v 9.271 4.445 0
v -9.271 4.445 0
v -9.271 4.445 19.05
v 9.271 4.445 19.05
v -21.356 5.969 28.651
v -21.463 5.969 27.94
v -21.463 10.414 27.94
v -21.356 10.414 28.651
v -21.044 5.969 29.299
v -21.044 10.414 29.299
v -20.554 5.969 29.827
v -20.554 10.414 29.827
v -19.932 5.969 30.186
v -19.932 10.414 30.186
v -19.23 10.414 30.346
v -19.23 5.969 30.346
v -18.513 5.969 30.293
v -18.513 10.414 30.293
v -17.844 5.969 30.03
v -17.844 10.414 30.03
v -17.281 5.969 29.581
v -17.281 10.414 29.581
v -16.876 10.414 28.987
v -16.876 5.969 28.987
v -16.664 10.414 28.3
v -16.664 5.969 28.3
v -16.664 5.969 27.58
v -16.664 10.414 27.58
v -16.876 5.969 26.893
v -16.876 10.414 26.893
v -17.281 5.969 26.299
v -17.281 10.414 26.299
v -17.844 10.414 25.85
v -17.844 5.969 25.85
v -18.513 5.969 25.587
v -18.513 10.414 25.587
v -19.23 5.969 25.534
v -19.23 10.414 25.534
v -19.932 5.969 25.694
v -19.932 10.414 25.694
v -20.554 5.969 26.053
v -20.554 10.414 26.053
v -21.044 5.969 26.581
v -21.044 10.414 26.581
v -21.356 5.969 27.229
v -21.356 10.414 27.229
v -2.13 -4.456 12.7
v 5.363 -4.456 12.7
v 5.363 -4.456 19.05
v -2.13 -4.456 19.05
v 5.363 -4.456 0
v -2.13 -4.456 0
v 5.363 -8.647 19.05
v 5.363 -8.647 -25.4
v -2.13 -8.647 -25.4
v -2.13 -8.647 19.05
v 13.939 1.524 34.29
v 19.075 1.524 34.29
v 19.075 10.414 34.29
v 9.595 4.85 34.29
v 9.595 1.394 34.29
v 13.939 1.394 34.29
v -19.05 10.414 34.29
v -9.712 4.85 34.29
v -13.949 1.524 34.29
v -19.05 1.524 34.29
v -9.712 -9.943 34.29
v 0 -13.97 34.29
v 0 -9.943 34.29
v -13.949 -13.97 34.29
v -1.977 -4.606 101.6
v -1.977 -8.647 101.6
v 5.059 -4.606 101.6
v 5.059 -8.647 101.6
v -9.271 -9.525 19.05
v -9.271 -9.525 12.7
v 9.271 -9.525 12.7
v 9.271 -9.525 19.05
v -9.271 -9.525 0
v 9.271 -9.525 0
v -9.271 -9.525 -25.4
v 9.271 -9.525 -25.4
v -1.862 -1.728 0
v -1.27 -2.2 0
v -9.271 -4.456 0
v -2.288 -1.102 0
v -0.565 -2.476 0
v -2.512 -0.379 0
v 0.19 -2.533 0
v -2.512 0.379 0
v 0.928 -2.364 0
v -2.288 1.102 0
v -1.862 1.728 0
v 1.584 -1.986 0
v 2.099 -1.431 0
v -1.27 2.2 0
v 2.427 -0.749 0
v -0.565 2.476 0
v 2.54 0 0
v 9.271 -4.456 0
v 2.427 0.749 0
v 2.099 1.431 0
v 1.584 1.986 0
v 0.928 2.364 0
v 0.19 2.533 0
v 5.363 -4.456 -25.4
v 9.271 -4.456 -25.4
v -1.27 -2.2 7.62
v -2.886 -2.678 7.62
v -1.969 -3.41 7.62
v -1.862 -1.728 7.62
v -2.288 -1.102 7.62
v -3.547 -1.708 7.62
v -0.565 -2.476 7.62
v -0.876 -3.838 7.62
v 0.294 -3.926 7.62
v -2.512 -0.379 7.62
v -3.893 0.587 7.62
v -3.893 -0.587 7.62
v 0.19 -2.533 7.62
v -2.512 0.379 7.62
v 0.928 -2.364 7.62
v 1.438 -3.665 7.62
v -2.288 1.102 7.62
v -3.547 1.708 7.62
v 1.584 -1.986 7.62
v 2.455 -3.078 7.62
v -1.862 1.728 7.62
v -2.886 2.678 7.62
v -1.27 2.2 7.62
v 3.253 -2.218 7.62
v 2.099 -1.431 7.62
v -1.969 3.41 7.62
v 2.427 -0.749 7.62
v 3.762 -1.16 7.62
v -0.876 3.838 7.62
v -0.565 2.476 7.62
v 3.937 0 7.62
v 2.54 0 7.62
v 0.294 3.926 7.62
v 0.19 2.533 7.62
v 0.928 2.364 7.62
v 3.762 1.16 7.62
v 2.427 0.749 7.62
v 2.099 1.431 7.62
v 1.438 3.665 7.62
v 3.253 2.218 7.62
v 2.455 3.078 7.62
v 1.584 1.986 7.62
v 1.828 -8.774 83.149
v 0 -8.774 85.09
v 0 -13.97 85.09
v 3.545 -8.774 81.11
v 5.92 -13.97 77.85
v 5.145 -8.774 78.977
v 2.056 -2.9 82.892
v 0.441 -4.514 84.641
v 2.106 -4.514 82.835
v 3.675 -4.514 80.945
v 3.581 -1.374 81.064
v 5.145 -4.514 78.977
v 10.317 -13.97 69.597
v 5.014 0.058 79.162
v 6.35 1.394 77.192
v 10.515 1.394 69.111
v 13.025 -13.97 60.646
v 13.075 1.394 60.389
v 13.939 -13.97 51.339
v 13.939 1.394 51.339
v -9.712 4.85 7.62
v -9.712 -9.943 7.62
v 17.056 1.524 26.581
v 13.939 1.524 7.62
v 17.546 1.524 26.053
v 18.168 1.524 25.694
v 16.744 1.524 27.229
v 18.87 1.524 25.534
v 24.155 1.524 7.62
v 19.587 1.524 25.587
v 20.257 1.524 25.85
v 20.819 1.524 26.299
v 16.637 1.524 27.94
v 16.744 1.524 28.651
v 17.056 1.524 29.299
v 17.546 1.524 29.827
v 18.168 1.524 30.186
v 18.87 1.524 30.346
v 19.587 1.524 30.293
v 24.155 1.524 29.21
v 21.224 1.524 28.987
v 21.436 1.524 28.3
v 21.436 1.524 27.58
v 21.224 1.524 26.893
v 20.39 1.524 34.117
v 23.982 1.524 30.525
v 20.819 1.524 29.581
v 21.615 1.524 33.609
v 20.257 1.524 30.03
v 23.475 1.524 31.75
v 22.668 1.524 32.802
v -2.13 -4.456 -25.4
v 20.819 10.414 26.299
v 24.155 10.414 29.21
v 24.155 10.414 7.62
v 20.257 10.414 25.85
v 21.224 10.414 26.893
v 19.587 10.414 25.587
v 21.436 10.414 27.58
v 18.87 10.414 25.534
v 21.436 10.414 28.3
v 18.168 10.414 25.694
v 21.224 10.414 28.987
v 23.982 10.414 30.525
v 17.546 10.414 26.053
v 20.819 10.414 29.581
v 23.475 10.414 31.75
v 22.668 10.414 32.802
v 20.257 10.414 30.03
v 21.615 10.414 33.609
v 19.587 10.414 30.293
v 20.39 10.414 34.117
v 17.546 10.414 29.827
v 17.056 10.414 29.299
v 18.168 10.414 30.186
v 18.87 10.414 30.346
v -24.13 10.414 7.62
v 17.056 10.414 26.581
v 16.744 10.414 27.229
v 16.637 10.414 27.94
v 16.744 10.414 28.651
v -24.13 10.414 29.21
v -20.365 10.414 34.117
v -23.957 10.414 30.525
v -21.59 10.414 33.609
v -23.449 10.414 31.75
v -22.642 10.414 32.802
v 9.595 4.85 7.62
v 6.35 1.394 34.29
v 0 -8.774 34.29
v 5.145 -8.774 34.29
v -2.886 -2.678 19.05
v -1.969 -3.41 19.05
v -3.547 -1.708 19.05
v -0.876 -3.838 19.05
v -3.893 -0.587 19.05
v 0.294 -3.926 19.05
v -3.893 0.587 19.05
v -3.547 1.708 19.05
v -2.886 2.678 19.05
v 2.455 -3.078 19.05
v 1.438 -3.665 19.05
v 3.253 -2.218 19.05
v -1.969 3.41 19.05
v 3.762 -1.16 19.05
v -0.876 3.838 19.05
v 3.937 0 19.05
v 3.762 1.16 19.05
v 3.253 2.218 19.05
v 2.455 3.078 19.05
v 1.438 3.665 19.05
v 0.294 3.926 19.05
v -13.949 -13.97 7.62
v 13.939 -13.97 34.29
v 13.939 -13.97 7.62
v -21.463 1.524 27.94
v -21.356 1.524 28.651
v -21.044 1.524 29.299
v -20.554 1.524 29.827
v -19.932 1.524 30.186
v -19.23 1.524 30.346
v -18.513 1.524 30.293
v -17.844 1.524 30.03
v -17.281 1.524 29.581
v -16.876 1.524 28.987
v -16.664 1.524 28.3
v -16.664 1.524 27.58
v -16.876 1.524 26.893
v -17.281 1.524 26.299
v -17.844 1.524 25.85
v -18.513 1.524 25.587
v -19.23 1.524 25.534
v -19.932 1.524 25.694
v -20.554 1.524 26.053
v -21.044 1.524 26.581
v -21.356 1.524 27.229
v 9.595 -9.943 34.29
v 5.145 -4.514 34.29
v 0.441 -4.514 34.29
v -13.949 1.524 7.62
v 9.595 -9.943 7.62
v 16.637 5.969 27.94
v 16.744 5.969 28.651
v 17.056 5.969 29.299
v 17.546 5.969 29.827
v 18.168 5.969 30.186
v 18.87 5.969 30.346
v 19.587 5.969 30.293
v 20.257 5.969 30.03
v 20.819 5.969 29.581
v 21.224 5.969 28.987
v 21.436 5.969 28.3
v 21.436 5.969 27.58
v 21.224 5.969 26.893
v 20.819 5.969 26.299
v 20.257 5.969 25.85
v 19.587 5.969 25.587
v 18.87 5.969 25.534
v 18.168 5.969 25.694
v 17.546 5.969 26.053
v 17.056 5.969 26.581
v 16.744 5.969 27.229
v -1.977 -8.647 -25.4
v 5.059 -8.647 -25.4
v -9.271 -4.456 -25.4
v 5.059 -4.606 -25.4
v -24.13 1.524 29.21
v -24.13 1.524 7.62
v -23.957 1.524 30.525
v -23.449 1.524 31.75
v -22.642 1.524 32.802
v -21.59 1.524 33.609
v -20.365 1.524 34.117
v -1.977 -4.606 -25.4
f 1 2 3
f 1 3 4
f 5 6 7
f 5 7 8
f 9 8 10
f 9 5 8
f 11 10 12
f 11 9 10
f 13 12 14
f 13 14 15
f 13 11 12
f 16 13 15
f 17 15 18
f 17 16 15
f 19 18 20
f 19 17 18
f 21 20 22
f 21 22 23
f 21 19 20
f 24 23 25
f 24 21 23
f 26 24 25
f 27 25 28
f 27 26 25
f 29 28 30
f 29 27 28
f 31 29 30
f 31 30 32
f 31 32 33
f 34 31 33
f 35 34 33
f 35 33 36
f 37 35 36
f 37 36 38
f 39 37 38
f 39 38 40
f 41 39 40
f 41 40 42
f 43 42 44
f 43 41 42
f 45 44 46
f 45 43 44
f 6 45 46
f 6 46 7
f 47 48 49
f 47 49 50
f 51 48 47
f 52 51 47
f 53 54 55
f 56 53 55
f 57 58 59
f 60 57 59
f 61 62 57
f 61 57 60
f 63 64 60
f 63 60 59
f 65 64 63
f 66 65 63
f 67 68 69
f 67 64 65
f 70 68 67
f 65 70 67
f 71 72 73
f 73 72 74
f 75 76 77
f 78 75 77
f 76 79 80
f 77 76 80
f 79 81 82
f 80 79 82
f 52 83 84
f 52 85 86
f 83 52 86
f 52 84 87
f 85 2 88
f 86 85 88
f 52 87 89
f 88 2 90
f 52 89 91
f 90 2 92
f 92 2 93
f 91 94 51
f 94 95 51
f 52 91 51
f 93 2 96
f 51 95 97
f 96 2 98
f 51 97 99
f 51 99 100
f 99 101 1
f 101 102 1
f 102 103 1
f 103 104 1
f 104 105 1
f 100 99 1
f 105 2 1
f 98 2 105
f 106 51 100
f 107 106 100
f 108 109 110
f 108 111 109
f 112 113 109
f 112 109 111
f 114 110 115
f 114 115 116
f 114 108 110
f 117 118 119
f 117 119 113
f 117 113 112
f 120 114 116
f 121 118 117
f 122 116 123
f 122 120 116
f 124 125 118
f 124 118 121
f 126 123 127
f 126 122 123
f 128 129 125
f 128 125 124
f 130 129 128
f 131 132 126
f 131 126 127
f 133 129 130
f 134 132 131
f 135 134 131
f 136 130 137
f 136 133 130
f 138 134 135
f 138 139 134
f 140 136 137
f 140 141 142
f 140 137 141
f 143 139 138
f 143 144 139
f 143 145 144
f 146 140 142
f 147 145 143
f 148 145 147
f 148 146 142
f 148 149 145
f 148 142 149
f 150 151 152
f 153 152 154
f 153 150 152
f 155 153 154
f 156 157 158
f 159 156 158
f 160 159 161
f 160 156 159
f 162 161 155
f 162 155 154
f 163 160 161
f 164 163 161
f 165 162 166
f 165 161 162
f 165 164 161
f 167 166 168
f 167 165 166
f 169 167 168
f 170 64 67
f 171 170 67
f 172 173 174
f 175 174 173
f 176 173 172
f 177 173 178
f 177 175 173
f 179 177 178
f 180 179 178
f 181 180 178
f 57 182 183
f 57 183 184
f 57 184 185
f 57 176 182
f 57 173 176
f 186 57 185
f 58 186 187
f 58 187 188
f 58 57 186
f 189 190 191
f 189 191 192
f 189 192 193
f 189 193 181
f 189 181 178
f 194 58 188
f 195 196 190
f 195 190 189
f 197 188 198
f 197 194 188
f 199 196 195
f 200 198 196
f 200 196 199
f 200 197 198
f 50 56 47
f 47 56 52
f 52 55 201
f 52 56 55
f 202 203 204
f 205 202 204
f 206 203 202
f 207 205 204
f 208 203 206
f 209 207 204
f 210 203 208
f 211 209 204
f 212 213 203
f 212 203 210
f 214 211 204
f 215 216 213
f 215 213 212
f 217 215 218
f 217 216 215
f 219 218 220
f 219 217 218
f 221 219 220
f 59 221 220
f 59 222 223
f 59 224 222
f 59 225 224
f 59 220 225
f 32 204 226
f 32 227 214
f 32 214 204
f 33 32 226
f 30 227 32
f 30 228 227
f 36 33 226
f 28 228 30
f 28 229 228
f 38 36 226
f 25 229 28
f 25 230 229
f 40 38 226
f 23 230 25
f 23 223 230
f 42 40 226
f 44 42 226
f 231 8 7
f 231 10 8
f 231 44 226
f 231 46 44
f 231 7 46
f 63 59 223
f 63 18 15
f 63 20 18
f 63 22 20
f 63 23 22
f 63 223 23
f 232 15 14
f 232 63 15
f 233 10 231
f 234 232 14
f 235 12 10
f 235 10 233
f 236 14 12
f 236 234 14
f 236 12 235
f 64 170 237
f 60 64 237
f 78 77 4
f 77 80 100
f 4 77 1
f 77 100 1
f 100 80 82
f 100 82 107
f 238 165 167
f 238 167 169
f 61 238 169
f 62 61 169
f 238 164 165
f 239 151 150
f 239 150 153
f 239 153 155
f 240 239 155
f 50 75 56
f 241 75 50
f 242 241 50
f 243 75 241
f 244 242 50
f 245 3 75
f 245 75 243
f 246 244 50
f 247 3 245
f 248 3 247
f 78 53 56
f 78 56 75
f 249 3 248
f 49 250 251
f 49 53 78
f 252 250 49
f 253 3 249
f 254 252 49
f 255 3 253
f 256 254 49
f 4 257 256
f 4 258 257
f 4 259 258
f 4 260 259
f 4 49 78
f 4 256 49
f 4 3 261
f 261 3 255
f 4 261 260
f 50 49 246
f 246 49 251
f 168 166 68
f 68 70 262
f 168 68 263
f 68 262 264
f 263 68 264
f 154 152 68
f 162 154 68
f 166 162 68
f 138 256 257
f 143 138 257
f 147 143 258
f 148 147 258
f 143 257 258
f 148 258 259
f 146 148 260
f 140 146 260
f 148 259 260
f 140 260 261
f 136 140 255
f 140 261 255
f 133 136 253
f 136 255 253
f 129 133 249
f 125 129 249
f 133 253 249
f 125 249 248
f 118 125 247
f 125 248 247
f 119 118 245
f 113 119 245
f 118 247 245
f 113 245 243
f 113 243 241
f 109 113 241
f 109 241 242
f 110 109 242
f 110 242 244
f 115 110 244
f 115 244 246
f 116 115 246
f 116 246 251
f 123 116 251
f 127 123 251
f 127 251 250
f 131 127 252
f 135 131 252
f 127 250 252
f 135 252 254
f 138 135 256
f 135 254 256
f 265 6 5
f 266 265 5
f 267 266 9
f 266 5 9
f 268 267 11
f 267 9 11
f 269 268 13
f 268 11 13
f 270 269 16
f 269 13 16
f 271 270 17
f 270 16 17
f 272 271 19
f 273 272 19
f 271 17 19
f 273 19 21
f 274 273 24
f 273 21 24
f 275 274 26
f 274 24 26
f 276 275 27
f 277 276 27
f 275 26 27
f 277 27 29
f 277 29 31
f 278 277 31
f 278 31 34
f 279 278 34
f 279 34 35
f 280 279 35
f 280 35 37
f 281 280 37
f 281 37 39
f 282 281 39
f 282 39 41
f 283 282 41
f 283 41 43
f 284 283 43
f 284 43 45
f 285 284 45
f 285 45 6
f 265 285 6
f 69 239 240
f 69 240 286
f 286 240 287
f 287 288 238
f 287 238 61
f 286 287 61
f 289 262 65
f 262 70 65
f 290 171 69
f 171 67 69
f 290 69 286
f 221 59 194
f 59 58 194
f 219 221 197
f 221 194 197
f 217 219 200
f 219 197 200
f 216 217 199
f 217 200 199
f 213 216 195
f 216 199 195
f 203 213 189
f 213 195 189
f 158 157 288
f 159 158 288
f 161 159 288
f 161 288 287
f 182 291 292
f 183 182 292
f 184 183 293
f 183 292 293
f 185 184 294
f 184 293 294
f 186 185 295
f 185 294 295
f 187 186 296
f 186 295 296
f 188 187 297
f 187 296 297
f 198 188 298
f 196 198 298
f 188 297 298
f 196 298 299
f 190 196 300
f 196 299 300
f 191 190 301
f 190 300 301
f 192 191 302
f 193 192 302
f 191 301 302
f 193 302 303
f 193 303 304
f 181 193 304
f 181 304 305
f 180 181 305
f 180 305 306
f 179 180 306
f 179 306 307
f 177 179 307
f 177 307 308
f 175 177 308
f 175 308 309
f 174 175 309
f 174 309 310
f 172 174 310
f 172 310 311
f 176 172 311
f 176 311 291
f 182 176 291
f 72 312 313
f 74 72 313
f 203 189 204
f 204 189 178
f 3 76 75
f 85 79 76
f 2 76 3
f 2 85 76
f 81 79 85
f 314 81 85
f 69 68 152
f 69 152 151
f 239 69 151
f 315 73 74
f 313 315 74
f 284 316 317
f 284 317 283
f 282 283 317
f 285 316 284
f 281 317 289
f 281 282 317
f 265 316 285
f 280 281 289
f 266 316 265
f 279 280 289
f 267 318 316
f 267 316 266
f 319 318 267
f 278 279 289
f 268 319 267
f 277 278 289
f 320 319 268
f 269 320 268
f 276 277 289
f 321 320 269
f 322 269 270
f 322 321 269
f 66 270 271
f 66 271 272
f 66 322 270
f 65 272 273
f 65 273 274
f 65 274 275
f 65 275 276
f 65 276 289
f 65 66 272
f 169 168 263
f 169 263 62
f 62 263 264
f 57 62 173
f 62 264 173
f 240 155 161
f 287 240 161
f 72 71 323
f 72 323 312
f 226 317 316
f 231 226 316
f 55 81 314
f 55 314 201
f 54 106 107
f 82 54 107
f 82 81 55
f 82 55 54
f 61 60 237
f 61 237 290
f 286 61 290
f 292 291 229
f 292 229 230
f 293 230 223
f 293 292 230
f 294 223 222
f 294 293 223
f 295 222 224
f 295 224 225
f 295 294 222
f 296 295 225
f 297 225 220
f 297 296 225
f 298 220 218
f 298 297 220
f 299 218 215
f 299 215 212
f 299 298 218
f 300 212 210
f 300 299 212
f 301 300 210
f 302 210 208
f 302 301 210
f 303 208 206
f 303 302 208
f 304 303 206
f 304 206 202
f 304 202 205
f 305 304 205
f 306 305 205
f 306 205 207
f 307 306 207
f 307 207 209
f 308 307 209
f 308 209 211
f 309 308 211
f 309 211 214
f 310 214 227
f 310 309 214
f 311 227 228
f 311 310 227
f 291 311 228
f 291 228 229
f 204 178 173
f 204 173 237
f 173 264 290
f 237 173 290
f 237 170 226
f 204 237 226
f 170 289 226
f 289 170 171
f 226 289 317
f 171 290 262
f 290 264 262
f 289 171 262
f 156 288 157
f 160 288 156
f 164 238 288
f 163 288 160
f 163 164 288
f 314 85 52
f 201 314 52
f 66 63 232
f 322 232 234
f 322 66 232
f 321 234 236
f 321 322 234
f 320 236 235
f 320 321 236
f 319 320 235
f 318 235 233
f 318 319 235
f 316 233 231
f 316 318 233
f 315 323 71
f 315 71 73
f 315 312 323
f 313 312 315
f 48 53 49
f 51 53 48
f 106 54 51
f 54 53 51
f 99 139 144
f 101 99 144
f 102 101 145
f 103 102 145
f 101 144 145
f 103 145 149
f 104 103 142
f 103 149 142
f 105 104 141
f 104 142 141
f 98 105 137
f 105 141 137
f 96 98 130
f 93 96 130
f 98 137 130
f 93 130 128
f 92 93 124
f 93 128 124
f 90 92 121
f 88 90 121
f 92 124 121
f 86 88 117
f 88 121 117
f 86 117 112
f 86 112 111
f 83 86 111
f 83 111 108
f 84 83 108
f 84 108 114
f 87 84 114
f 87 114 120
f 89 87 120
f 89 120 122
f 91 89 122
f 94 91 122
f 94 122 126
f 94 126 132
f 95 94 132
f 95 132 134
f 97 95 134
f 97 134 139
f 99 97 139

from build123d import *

# Parameters (mm, degrees)
F0_W         = 18.542
F0_H         = 8.89
F1_DEPTH     = 6.35
F2_DEPTH     = 5.08
F3_W         = 18.542
F3_H         = 5.0685656011
F4_DEPTH     = 25.4
F5_W         = 7.493
F5_H         = 4.191
F6_DEPTH     = 125.222
F7_DEPTH     = 6.35
F8_W         = 7.0358
F8_H         = 4.0401988663
F9_DEPTH     = 127
F11_DEPTH    = 21.59
F12_R        = 2.413
F13_DEPTH    = 25.4
F14_W        = 19.3073768169
F14_H        = 14.7933904082
F15_DEPTH    = 41.656
F16_W        = 10.1808982092
F16_H        = 21.59
F16_W_2      = 10.2163404226
F17_DEPTH    = 15.494
F18_DEPTH    = 5.08
F19_DEPTH    = 6.35
F20_W        = 13.9391366392
F20_H        = 15.3644406528
F21_DEPTH    = 50.8
F22_T1_DEPTH = 184.1193966406
F23_SIZE     = 6.35
F24_R        = 5.08
F25_W        = 7.1110432036
F25_H        = 4.2591807432
F26_DEPTH    = 73.152
F27_DEPTH    = 4.445
F28_R        = 2.54
F30_DEPTH    = 25.4
F29_R        = 3.937
F31_DEPTH    = 11.43


# Not quite as in the source:
# - a fillet or chamfer that OpenCascade refuses, or shapes differently, is made with other operations: its cross-section is extruded or revolved along the edge and cut away or added


with BuildPart() as f1:
    # F0 (on Top) → F1 (new body)
    with BuildSketch(Plane.XY):
        Rectangle(F0_W, F0_H)
    extrude(amount=F1_DEPTH)

    # F2 (add): a face of the model
    f2_faces = [f1.faces().sort_by_distance(p)[0] for p in [
        (0, -4.445, 3.175),
    ]]
    extrude(f2_faces, amount=F2_DEPTH)

    # F3 (on face) → F4 (join)
    with BuildSketch(Plane(origin=(0, 0, 0), x_dir=(1, 0, 0), z_dir=(0, 0, -1))):
        with Locations((0, 6.9907171994)):
            Rectangle(F3_W, F3_H)
    extrude(amount=F4_DEPTH)

    # F5 (on face) → F6 (cut)
    with BuildSketch(Plane(origin=(0, 0, -25.4), x_dir=(1, 0, 0), z_dir=(0, 0, -1))):
        with Locations((1.6165795822, 6.5519343989)):
            Rectangle(F5_W, F5_H)
    extrude(amount=-F6_DEPTH, mode=Mode.SUBTRACT)

    # F7 (add): a face of the model
    f7_faces = [f1.faces().sort_by_distance(p)[0] for p in [
        (-0.2230199424, -1.9865219107, 6.35),
    ]]
    extrude(f7_faces, amount=F7_DEPTH)

    # F19 (add): a face of the model
    f19_faces = [f1.faces().sort_by_distance(p)[0] for p in [
        (-0.2230199424, -1.9865219107, 12.7),
    ]]
    extrude(f19_faces, amount=F19_DEPTH)

    # F28 (on face) → F30 (cut)
    with BuildSketch(Plane.XY.offset(19.05)):
        Circle(F28_R)
    extrude(amount=-F30_DEPTH, mode=Mode.SUBTRACT)

    # F29 (on face) → F31 (cut)
    with BuildSketch(Plane.XY.offset(19.05)):
        Circle(F29_R)
    extrude(amount=-F31_DEPTH, mode=Mode.SUBTRACT)


with BuildPart() as f9:
    # F8 (on face) → F9 (new body)
    with BuildSketch(Plane(origin=(0, 0, -25.4), x_dir=(1, 0, 0), z_dir=(0, 0, -1))):
        with Locations((1.5412379404, 6.6265871283)):
            Rectangle(F8_W, F8_H)
    extrude(amount=-F9_DEPTH)


with BuildPart() as f11:
    # F10 (on face) → F11 (new body)
    with BuildSketch(Plane.XY.offset(12.7)):
        Polygon((-24.13, 5.969), (-24.13, 0), (-24.13, -13.97), (24.1554770619, -13.97), (24.1554770619, 5.969), align=None)
    extrude(amount=F11_DEPTH)

    # F12 (on face) → F13 (cut)
    with BuildSketch(Plane(origin=(0, 5.969, 0), x_dir=(-1, 0, 0), z_dir=(0, 1, 0))):
        with Locations((19.05, 27.94)):
            Circle(F12_R)
        with Locations((-19.05, 27.94)):
            Circle(F12_R)
    extrude(amount=-F13_DEPTH, mode=Mode.SUBTRACT)

    # F14 (on face) → F15 (cut)
    with BuildSketch(Plane(origin=(0, 0, 12.7), x_dir=(1, 0, 0), z_dir=(0, 0, -1))):
        with Locations((-0.0584181398, 2.5467472151)):
            Rectangle(F14_W, F14_H)
    extrude(amount=-F15_DEPTH, mode=Mode.SUBTRACT)

    # F16 (on face) → F17 (cut)
    with BuildSketch(Plane.XZ.offset(13.97)):
        with Locations((-19.0395508954, 23.495)):
            Rectangle(F16_W, F16_H)
        with Locations((19.0473068506, 23.495)):
            Rectangle(F16_W_2, F16_H)
    extrude(amount=-F17_DEPTH, mode=Mode.SUBTRACT)

    # F18 (add): a face of the model
    f18_faces = [f11.faces().sort_by_distance(p)[0] for p in [
        (19.0473068506, 2.0464031983, 12.7),
    ]]
    extrude(f18_faces, amount=F18_DEPTH)

    # F20 (on face) → F21 (join)
    with BuildSketch(Plane.XY.offset(34.29)):
        with Locations((6.9695683196, -6.2877796736)):
            Rectangle(F20_W, F20_H)
    extrude(amount=F21_DEPTH)

    # F22: fillet of radius 47.8303990977 on 1 edges, made by hand

    # F22_s2 → F22_t1 (cut)
    with BuildSketch(Plane.XZ.offset(-85.7719186467)):
        with BuildLine():
            ThreePointArc((0, 85.09), (10.3172191212, 69.5970819282), (13.9391366392, 51.3390088024))
            Line((13.9391366392, 51.3390088024), (13.9391366392, 85.09))
            Line((13.9391366392, 85.09), (0, 85.09))
        make_face()
    extrude(amount=F22_T1_DEPTH, mode=Mode.SUBTRACT)

    # F23
    f23_edges = [f11.edges().sort_by_distance(p)[0] for p in [
        (0, 1.394441, 59.69),
    ]]
    chamfer(f23_edges, length=F23_SIZE)

    # F24
    f24_edges = [f11.edges().sort_by_distance(p)[0] for p in [
        (-24.13, 3.7465, 34.29),
        (24.155477, 3.7465, 34.29),
    ]]
    fillet(f24_edges, radius=F24_R)

    # F25 (on face) → F26 (cut)
    with BuildSketch(Plane.XY.offset(34.29)):
        with Locations((1.5899057034, -6.6439488437)):
            Rectangle(F25_W, F25_H)
    extrude(amount=F26_DEPTH, mode=Mode.SUBTRACT)

    # F27 (add): a face of the model
    f27_faces = [f11.faces().sort_by_distance(p)[0] for p in [
        (0.0131143273, 5.969, 20.6399690169),
    ]]
    extrude(f27_faces, amount=F27_DEPTH)


solid = Compound([f1.part, f9.part, f11.part])
